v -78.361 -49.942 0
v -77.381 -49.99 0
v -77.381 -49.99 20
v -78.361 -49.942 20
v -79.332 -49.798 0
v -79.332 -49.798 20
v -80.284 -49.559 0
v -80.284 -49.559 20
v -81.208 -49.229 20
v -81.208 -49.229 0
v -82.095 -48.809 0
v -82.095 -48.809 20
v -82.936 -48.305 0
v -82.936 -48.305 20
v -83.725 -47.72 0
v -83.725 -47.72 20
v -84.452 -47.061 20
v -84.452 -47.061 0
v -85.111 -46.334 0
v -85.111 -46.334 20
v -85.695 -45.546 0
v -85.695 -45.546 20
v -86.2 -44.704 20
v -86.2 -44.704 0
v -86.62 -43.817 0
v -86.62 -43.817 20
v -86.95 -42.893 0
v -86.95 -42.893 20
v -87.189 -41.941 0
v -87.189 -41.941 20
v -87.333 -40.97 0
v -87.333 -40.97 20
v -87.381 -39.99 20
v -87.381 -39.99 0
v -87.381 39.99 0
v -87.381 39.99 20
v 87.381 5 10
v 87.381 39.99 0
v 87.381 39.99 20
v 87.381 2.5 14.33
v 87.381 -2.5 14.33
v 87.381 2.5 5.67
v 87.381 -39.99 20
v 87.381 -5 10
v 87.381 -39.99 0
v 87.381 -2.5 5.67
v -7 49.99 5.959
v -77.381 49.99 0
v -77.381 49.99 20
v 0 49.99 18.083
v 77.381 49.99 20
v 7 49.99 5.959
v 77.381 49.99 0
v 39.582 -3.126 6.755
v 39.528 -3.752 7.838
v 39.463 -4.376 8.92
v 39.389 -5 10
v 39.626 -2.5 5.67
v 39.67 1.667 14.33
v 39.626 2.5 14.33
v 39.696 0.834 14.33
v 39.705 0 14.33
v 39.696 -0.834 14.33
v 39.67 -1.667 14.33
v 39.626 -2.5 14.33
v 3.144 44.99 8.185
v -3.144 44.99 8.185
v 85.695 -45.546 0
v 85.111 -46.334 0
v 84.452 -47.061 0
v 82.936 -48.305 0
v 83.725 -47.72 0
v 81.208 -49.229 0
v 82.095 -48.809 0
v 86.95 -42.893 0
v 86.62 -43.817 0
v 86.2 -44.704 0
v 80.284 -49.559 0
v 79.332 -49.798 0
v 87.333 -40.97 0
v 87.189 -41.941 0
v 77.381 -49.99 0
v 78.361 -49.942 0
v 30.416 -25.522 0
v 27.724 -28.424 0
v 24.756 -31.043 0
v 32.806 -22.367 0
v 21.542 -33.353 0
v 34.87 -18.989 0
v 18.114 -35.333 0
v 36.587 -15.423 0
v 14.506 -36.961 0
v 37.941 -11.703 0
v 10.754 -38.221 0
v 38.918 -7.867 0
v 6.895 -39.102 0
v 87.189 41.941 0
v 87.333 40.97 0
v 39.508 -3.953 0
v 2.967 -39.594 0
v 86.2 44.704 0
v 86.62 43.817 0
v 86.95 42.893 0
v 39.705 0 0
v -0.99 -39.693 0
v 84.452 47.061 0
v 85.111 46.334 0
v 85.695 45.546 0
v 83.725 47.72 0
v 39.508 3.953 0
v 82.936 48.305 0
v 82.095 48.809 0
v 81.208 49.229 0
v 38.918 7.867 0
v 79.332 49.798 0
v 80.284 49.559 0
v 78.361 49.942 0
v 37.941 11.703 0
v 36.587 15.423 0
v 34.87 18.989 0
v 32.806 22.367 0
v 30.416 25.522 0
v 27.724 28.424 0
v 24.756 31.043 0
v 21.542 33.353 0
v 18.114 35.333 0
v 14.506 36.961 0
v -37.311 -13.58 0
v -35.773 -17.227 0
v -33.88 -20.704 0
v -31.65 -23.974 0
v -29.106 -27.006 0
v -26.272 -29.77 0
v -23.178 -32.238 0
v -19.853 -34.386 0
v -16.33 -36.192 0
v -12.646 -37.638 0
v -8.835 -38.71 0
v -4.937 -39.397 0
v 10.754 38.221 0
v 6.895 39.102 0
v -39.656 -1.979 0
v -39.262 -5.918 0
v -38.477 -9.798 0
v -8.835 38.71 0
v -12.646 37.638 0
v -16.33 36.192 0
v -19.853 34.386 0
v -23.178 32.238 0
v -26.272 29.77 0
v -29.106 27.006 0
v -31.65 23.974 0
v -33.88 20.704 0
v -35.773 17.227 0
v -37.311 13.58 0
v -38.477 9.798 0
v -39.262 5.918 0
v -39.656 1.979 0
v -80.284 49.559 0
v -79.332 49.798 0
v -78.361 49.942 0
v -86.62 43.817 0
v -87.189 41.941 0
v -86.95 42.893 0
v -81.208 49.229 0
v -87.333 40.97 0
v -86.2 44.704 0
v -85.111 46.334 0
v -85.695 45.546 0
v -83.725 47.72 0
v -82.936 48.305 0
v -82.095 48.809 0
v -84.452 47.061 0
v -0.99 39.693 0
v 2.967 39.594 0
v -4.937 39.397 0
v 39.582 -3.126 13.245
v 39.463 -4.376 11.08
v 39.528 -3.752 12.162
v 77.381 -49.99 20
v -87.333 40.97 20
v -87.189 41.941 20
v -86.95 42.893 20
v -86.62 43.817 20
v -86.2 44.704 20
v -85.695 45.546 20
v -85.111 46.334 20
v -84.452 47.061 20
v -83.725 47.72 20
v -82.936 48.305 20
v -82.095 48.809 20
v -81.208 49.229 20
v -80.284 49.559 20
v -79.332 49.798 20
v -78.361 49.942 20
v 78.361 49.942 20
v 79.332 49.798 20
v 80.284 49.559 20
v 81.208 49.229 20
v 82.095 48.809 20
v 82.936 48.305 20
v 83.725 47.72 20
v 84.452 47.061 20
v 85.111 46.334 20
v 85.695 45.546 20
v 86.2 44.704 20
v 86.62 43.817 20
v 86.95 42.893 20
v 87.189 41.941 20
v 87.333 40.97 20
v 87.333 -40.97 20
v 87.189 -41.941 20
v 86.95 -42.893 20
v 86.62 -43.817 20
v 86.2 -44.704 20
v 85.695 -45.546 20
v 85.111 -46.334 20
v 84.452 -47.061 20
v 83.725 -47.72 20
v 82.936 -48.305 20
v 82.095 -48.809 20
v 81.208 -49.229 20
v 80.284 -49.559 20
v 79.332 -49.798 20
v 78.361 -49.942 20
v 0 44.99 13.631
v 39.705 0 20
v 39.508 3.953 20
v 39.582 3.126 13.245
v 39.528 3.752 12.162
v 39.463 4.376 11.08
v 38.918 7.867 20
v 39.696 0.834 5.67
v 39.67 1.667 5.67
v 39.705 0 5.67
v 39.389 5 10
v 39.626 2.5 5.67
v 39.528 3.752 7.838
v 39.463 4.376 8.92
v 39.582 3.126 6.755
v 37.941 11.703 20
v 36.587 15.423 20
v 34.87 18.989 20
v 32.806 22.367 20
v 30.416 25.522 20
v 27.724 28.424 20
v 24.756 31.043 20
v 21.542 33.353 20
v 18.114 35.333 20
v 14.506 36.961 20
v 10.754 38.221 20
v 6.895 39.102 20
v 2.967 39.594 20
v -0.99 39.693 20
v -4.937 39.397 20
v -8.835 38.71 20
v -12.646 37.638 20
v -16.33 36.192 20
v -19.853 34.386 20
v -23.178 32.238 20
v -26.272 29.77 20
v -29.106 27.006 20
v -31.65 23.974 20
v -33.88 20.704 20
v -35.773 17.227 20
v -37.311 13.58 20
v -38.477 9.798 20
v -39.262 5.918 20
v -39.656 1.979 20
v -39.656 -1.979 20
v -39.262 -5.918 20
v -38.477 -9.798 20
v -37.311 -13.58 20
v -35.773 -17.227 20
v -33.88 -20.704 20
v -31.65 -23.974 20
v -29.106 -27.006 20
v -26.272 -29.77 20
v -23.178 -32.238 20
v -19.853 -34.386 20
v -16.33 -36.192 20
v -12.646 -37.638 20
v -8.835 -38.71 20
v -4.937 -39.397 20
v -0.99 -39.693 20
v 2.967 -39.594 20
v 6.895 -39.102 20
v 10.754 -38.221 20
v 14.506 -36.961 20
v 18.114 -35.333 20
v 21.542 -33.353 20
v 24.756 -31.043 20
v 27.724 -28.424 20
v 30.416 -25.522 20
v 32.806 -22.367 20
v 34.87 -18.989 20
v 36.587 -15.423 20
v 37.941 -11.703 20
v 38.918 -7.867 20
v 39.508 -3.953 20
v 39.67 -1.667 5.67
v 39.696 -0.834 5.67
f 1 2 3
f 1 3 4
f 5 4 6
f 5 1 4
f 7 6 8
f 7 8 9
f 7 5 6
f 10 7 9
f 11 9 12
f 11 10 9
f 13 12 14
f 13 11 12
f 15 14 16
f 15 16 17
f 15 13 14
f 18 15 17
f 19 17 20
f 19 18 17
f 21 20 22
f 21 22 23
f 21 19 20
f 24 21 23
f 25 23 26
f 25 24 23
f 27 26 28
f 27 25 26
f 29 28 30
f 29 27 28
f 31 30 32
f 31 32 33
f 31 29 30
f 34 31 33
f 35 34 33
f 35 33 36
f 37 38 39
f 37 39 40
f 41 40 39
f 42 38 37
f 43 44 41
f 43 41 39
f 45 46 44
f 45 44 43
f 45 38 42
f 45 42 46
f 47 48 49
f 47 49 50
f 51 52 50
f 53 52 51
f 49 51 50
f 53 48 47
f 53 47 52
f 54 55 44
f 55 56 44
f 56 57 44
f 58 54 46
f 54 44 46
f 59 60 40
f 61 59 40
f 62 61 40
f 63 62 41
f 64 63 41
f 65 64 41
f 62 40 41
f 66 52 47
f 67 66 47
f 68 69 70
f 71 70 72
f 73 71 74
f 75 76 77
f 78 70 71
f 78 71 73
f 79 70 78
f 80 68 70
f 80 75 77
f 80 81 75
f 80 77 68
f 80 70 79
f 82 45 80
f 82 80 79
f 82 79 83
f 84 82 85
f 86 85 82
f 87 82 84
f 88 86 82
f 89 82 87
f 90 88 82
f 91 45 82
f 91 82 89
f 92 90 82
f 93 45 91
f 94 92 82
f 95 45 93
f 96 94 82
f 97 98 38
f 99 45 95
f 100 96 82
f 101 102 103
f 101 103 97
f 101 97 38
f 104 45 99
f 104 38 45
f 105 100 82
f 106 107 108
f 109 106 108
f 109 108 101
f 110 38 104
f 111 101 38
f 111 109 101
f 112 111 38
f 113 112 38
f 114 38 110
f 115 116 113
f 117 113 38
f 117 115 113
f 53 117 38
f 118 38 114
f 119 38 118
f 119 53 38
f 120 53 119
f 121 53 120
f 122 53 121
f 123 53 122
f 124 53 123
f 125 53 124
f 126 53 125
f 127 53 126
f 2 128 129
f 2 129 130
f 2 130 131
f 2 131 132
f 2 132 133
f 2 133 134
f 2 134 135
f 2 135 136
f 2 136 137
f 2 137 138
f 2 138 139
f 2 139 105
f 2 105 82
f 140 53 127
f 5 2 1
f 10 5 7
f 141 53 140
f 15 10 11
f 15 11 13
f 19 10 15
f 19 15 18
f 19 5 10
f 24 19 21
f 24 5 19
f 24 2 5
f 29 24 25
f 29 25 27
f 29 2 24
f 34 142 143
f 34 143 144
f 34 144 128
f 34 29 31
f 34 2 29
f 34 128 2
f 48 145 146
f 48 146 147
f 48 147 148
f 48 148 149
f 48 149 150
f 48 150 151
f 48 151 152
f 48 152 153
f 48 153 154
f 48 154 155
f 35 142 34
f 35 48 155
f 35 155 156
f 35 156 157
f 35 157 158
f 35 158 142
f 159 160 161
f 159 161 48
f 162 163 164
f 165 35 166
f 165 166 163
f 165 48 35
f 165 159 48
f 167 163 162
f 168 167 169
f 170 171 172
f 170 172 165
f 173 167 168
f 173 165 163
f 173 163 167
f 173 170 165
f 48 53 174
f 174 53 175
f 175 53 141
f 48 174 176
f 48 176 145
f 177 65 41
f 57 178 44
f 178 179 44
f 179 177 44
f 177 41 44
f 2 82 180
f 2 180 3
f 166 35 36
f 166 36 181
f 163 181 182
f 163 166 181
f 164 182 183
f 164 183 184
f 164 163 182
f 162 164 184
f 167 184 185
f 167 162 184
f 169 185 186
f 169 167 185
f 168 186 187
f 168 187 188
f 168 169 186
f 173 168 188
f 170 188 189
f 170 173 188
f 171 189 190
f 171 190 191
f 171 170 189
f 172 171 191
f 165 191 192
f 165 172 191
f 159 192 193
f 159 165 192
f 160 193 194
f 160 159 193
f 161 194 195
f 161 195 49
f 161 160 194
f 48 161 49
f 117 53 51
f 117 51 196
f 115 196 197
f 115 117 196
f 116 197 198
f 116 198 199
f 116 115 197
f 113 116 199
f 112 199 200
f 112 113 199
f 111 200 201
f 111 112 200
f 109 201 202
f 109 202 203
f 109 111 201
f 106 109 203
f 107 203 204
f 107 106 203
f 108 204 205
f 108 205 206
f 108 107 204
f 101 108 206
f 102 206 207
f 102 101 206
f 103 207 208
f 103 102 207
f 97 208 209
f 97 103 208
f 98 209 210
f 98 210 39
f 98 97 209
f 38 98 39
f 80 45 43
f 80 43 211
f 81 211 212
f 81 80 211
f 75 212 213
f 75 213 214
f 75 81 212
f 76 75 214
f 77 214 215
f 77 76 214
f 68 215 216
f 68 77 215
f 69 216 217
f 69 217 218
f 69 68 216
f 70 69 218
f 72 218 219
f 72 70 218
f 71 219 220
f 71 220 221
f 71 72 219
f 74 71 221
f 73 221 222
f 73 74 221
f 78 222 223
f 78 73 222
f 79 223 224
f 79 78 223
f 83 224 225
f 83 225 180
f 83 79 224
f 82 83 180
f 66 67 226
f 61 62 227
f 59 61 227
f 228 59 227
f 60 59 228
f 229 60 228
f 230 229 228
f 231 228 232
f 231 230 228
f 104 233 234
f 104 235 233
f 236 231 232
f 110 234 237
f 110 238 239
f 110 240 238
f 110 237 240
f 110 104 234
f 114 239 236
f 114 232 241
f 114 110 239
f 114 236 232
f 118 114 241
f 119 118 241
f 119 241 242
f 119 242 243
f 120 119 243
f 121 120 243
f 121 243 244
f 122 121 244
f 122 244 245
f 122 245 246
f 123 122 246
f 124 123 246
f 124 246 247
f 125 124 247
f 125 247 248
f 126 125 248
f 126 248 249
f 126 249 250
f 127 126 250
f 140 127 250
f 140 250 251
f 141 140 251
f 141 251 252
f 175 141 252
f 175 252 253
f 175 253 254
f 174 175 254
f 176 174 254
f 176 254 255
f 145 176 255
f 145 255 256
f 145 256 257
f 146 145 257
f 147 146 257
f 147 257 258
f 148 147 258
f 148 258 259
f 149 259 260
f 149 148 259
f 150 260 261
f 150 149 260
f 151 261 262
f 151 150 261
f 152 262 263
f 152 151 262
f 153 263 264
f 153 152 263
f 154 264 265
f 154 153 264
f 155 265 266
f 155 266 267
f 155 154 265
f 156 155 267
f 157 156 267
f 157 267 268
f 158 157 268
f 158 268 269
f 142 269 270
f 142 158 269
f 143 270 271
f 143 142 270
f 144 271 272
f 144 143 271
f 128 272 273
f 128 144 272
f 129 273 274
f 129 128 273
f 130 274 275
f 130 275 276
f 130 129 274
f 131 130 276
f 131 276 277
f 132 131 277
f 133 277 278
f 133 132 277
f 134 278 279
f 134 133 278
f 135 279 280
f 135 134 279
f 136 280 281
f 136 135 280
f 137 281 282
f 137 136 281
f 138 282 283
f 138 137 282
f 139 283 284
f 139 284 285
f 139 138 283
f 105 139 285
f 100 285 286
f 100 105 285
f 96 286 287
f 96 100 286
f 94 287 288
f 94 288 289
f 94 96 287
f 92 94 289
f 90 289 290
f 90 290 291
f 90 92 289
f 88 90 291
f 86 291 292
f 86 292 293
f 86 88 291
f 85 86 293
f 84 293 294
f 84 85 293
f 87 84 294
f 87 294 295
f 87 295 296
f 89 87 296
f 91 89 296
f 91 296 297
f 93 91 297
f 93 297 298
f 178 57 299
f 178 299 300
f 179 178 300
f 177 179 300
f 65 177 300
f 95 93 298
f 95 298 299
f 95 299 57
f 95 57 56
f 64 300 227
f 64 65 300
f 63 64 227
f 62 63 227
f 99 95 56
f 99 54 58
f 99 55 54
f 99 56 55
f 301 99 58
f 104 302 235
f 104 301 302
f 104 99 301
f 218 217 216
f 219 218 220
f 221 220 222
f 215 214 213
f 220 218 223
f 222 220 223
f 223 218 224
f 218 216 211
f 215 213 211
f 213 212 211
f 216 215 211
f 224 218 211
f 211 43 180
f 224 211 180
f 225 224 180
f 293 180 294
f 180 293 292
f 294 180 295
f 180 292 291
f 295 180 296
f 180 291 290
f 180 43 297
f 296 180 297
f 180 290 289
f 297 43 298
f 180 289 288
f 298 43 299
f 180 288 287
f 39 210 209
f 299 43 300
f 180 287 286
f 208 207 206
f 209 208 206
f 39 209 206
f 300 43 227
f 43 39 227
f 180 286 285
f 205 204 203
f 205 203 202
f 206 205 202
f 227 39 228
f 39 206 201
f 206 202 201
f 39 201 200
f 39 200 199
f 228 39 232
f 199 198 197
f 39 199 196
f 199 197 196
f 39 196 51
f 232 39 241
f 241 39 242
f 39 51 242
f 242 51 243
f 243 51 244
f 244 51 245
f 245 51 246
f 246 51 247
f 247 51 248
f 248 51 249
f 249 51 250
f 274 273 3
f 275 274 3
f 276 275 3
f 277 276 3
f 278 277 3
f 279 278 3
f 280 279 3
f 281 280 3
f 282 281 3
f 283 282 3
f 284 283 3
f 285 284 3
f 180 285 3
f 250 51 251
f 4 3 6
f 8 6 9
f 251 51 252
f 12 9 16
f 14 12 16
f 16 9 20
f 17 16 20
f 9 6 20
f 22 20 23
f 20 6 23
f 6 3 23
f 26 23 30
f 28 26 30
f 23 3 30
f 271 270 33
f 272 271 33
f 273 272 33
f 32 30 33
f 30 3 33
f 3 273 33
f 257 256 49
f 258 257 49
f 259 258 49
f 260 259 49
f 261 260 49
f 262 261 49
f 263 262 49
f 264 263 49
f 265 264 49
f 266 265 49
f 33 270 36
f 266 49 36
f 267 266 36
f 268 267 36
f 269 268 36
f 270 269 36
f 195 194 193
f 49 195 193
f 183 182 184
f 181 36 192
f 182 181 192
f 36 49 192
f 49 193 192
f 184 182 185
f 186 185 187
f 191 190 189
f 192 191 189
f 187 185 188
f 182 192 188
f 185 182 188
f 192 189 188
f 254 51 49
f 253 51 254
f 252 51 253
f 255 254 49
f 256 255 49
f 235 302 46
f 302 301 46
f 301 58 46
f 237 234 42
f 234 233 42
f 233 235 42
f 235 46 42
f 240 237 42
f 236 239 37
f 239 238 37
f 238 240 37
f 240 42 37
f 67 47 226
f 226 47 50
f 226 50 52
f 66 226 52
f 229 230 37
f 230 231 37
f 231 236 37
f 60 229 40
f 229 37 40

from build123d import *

# Parameters (mm, degrees)
SKETCH1_R               = 39.705202959
BOSS_EXTRUDE1_DEPTH     = 20
CUT_EXTRUDE1_DEPTH      = 5
CUT_EXTRUDE1_DRAFT      = -24
CUT_EXTRUDE2_REACH      = 184.868
CUT_EXTRUDE2_END_RADIUS = 39.705202959


with BuildPart() as part:
    # Sketch1 → Boss-Extrude1 (new body)
    with BuildSketch(Plane.XY):
        with BuildLine():
            Line((77.380717994, -49.989899132), (-77.380717994, -49.989899132))
            ThreePointArc((-77.380717994, -49.989899132), (-84.451785806, -47.060966943), (-87.380717994, -39.989899132))
            Line((-87.380717994, -39.989899132), (-87.380717994, 39.989899132))
            ThreePointArc((-87.380717994, 39.989899132), (-84.451785806, 47.060966943), (-77.380717994, 49.989899132))
            Line((-77.380717994, 49.989899132), (77.380717994, 49.989899132))
            ThreePointArc((77.380717994, 49.989899132), (84.451785806, 47.060966943), (87.380717994, 39.989899132))
            Line((87.380717994, 39.989899132), (87.380717994, -39.989899132))
            ThreePointArc((87.380717994, -39.989899132), (84.451785806, -47.060966943), (77.380717994, -49.989899132))
        make_face()
        Circle(SKETCH1_R, mode=Mode.SUBTRACT)
    extrude(amount=BOSS_EXTRUDE1_DEPTH)


with BuildPart() as cut_extrude1_tool:
    # Sketch2 → Cut-Extrude1 (with draft: the straight prism first)
    with BuildSketch(Plane(origin=(0, 49.989899132, 0), x_dir=(1, 0, 0), z_dir=(0, 1, 0))):
        Polygon((0, -18.082903769), (7, -5.958548116), (-7, -5.958548116), align=None)
    extrude(amount=-CUT_EXTRUDE1_DEPTH)
    # Cut-Extrude1: the draft: its side faces are tilted about the plane it starts from
    cut_extrude1_sides = [cut_extrude1_tool.faces().sort_by_distance(p)[0] for p in [
        (3.5, 47.489899132, 12.020725942),
        (0, 47.489899132, 5.958548116),
        (-3.5, 47.489899132, 12.020725942),
    ]]
    draft(cut_extrude1_sides, Plane(origin=(0, 49.989899132, 0), x_dir=(1, 0, 0), z_dir=(0, 1, 0)), CUT_EXTRUDE1_DRAFT)


with BuildPart() as part_1:
    add(part.part)

    # Cut-Extrude1: cut by cut_extrude1_tool
    add(cut_extrude1_tool.part, mode=Mode.SUBTRACT)

    # Cut-Extrude2: up to this cylinder (the profile starts outside it)
    cut_extrude2_end = Plane(origin=(0, 0, 10), z_dir=(0, 0, -1)) * Cylinder(CUT_EXTRUDE2_END_RADIUS, 450.146405919, mode=Mode.PRIVATE)
    # Sketch3 → Cut-Extrude2 (cut, up to the surface)
    with BuildSketch(Plane(origin=(87.380717994, 0, 0), x_dir=(0, 0, -1), z_dir=(1, 0, 0)), mode=Mode.PRIVATE) as cut_extrude2_sk1:
        Polygon((-10, 5), (-14.330127019, 2.5), (-14.330127019, -2.5), (-10, -5), (-5.669872981, -2.5), (-5.669872981, 2.5), align=None)
    cut_extrude2_tool1 = extrude(cut_extrude2_sk1.sketch, amount=-CUT_EXTRUDE2_REACH, mode=Mode.PRIVATE) - cut_extrude2_end
    add(cut_extrude2_tool1.solids().sort_by_distance((87.380718, 0, 10))[0], mode=Mode.SUBTRACT)


solid = part_1.part
